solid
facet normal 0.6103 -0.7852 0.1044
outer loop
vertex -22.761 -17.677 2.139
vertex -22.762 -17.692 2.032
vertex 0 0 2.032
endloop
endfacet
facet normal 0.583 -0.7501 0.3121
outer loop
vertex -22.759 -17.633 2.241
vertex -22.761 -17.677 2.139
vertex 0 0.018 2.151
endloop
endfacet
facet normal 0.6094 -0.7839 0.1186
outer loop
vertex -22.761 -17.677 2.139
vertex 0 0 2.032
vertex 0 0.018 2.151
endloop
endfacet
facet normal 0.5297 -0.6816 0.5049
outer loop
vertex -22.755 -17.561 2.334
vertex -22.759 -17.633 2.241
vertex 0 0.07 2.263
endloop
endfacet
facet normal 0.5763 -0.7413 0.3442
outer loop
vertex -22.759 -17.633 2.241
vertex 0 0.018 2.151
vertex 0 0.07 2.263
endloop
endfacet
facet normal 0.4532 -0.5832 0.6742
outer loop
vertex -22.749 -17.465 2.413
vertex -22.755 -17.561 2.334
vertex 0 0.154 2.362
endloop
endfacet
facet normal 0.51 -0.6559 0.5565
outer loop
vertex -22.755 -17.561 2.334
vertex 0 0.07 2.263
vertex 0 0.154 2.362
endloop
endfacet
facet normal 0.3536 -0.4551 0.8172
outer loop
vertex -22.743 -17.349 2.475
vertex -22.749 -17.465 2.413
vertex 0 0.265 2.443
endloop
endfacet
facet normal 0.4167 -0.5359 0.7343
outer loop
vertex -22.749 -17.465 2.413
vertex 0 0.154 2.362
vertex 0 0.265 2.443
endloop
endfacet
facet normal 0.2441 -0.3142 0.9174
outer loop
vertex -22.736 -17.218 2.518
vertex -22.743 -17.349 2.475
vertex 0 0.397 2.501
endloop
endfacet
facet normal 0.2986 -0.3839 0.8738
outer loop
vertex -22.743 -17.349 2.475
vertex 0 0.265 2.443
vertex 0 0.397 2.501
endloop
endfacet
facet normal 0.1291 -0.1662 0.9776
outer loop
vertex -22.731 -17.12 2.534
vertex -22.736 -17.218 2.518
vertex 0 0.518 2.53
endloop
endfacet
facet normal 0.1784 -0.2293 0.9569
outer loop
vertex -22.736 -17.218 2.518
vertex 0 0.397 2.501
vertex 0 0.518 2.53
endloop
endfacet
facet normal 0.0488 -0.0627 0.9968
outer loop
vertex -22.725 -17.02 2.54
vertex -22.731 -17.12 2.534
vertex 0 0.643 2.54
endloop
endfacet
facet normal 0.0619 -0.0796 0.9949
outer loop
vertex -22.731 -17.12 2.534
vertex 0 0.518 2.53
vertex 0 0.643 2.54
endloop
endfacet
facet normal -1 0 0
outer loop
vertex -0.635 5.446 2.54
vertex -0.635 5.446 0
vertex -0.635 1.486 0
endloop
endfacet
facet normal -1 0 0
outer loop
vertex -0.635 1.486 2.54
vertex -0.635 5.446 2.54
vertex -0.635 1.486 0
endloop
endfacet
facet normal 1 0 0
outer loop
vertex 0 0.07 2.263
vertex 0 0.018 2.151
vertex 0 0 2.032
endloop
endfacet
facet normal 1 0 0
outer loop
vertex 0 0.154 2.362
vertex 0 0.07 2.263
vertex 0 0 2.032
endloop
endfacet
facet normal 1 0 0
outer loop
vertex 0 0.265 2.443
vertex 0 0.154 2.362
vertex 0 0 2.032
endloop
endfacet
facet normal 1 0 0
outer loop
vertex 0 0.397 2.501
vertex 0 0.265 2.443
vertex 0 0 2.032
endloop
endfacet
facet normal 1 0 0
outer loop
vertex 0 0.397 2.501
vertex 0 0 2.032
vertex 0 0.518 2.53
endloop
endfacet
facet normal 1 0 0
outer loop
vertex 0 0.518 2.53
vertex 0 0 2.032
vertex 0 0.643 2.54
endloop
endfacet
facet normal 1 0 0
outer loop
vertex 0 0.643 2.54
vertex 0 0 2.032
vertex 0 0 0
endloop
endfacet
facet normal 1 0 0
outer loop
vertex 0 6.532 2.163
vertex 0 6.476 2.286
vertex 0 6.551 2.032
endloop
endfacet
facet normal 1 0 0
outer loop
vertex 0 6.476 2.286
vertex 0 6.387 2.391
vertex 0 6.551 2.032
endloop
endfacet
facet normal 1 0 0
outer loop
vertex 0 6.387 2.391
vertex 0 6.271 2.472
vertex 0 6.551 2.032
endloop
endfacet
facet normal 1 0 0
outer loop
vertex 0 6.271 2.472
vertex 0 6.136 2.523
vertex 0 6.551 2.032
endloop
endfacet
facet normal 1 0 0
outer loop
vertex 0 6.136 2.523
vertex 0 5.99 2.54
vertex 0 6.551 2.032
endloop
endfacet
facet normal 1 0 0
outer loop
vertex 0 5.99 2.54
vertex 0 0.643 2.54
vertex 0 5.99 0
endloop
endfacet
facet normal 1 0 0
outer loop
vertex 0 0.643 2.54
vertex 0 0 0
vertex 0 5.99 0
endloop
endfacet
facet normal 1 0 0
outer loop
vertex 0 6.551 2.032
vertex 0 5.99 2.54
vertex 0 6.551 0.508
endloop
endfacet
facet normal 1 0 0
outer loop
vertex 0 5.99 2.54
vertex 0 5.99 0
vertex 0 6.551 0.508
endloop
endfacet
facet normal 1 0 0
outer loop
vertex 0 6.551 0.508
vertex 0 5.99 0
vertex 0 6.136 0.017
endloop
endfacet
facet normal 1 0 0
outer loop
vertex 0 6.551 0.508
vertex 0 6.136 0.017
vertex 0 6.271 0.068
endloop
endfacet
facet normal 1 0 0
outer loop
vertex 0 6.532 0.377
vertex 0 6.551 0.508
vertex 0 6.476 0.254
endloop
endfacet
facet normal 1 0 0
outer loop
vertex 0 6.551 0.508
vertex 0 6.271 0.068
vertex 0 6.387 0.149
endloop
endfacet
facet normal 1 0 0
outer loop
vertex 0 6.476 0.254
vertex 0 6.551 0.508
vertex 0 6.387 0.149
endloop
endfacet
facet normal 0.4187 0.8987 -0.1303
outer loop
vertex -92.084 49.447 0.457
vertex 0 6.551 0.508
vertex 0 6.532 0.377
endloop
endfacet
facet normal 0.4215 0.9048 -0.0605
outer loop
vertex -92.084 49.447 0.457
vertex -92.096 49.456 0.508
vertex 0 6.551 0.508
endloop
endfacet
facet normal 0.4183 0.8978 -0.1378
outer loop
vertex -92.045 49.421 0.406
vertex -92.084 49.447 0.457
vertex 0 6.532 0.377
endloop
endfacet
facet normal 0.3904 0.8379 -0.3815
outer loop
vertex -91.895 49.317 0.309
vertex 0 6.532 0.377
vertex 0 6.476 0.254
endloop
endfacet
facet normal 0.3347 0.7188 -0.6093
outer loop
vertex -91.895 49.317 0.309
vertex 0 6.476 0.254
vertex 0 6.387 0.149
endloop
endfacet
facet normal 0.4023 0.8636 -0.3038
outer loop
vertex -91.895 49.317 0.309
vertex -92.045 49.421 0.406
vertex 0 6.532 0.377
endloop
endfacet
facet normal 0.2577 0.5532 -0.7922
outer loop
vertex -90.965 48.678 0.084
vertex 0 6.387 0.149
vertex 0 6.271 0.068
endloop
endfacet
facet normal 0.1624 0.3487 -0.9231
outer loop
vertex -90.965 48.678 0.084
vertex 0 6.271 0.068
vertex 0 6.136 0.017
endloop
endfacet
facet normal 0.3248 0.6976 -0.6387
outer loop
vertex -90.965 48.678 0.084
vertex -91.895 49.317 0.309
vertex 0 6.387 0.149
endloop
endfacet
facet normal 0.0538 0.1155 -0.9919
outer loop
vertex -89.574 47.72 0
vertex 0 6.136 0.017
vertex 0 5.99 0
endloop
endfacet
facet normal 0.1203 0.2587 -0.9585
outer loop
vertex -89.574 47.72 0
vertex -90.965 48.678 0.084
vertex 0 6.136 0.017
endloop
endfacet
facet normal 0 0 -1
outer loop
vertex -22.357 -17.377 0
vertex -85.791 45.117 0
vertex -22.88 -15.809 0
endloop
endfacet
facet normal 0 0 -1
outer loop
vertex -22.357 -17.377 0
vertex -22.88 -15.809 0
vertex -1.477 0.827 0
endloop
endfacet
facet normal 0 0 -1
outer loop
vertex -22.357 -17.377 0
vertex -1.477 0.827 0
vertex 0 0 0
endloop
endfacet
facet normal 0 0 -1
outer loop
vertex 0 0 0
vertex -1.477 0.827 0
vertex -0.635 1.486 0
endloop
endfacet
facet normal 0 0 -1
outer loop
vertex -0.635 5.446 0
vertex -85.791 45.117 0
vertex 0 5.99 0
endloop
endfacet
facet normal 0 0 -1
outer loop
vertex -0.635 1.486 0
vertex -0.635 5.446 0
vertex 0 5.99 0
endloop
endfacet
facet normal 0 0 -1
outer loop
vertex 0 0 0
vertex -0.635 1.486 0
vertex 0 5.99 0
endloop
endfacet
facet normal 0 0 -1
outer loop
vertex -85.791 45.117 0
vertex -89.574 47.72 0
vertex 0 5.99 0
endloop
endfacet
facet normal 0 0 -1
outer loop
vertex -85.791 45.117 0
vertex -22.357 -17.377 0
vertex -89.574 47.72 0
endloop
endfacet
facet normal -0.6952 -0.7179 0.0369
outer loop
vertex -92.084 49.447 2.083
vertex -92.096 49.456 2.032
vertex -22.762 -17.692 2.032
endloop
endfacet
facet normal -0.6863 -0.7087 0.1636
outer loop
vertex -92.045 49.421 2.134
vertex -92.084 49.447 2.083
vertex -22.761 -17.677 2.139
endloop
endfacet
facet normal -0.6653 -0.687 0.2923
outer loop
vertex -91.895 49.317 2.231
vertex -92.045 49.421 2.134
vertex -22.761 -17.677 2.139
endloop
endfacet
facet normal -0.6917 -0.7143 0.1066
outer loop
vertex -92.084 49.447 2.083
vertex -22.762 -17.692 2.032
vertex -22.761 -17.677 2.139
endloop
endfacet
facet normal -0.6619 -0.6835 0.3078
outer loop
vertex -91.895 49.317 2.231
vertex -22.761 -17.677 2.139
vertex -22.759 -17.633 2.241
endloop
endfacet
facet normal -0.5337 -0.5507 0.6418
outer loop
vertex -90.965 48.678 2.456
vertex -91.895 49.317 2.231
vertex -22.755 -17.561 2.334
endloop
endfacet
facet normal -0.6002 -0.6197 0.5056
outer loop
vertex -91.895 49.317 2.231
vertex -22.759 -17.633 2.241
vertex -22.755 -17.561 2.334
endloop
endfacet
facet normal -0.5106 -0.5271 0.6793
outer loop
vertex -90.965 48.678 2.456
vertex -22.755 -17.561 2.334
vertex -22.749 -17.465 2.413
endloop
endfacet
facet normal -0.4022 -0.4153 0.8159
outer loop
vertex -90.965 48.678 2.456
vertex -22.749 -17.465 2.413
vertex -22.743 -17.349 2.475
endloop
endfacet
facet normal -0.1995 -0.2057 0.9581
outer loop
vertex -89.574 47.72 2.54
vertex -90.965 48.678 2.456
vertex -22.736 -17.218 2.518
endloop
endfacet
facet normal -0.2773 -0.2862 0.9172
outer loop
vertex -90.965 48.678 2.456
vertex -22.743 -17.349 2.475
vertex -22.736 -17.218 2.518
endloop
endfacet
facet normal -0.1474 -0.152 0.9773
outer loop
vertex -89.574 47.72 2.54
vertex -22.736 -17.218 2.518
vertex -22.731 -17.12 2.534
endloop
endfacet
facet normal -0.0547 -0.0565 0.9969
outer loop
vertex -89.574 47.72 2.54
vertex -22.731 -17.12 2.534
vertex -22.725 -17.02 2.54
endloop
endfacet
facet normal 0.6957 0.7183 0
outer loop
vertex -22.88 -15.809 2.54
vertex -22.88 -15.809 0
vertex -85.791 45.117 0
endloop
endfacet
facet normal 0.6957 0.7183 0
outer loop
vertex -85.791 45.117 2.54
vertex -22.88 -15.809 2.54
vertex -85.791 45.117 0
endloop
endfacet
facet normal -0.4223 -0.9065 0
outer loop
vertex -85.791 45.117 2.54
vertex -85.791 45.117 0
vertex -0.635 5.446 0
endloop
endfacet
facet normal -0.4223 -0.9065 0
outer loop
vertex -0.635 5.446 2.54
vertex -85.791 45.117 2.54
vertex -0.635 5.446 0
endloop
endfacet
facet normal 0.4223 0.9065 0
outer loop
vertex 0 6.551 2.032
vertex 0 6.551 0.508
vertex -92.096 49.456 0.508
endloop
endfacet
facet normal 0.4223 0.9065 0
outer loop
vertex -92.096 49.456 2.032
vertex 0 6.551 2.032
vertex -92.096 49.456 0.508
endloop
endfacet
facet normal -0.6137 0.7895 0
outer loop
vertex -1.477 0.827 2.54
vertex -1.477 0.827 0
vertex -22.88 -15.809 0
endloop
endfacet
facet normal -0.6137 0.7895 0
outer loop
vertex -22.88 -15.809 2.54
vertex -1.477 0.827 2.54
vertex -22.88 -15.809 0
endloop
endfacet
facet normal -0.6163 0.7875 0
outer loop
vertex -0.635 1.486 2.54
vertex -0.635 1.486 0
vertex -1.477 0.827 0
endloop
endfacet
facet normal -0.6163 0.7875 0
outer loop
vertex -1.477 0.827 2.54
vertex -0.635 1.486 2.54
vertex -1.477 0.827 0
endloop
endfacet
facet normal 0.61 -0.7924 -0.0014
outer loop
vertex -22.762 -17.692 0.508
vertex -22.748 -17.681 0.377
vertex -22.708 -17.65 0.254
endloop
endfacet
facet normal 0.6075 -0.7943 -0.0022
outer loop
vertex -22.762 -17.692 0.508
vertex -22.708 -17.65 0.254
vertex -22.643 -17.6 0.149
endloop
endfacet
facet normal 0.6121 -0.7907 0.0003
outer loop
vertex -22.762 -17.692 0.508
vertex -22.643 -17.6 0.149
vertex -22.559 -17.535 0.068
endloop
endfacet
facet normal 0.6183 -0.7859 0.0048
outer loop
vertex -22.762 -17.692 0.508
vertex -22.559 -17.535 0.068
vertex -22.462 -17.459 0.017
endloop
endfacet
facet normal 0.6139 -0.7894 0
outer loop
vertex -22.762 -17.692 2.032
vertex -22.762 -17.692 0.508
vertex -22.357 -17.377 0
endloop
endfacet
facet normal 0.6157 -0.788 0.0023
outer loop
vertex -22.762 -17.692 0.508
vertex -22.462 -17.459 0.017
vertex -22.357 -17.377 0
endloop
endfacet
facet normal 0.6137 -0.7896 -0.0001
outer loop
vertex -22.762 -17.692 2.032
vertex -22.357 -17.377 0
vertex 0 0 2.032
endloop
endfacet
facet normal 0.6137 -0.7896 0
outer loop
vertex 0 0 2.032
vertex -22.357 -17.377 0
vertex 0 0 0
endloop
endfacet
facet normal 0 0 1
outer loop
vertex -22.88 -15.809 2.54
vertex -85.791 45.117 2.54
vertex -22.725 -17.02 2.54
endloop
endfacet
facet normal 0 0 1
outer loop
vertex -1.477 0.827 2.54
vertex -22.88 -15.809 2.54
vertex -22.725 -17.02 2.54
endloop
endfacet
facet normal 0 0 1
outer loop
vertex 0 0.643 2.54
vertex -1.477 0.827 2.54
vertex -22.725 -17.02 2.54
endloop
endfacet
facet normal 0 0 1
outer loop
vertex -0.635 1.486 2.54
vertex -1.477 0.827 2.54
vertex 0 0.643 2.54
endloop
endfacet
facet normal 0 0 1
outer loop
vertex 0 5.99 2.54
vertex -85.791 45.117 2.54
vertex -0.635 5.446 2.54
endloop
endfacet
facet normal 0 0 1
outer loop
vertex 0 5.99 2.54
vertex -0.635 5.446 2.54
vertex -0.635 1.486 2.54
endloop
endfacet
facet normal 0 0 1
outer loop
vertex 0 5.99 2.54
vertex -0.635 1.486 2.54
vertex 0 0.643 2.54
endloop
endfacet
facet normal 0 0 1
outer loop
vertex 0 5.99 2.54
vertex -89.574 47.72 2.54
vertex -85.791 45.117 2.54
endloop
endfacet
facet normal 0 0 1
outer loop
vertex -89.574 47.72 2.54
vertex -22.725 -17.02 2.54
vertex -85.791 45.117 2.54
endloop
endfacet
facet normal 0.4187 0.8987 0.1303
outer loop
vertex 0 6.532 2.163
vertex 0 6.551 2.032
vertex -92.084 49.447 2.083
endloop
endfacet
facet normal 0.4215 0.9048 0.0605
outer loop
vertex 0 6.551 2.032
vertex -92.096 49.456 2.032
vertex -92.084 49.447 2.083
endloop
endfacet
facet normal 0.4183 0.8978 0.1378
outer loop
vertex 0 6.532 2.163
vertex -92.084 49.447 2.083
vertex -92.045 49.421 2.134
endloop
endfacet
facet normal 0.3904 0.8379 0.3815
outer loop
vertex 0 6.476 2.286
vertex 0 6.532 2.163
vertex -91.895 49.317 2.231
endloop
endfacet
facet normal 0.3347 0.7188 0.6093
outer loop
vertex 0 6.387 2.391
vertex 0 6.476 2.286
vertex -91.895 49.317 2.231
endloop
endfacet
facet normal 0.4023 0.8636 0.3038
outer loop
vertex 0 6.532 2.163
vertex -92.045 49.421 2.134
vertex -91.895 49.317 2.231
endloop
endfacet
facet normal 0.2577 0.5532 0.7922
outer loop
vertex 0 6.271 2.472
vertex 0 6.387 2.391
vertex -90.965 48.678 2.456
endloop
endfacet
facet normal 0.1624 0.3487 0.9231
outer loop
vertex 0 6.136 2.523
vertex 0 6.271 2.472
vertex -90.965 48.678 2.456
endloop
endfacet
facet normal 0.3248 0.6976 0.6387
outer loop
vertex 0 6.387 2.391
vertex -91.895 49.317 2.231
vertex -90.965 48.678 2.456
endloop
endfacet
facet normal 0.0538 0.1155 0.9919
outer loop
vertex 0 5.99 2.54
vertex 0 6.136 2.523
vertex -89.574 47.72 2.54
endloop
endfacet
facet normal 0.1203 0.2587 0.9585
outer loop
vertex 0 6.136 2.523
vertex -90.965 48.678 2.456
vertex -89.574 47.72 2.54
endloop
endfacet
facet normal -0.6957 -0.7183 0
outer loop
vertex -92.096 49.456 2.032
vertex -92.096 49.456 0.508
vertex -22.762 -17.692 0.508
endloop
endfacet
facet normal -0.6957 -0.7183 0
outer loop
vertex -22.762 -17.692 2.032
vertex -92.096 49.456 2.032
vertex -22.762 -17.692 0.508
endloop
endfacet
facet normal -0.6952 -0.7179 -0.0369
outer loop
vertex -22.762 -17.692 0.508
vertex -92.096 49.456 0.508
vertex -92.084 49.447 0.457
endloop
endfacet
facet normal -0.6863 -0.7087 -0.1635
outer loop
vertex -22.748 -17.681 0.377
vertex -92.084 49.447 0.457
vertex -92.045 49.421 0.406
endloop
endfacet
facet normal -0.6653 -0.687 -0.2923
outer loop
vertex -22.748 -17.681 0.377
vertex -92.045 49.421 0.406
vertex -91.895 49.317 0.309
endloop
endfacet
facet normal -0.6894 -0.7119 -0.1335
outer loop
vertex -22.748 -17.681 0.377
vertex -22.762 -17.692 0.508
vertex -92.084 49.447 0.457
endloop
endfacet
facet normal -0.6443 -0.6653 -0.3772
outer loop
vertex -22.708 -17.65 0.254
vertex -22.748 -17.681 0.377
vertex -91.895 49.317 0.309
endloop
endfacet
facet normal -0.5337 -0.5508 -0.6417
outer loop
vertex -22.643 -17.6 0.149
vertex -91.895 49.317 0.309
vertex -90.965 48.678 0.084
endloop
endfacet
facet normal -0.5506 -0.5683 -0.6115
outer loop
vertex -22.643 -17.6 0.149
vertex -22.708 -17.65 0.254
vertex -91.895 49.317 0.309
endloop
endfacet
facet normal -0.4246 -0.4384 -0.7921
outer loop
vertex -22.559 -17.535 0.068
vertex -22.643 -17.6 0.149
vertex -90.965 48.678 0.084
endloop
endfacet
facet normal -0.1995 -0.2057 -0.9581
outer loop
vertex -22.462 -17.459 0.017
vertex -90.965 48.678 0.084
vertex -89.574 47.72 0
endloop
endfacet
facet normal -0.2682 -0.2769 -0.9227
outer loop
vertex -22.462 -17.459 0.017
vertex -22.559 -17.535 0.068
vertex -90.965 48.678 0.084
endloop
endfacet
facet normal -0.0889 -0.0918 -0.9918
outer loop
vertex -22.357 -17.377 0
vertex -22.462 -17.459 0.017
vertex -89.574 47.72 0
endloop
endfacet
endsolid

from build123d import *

# Parameters (mm, degrees)
F1_DEPTH = 2.54
F2_R     = 0.508


with BuildPart() as f1:
    # F0 (on Top) → F1 (new body)
    with BuildSketch(Plane.XY):
        Polygon((-22.761848, -17.692075), (0, 0), (0, 6.550886), (-92.096252, 49.455902), align=None)
        Polygon((-85.790934, 45.117378), (-0.635, 5.445659), (-0.635, 1.485886), (-1.476617, 0.826895), (-22.88023, -15.809466), align=None, mode=Mode.SUBTRACT)
    extrude(amount=F1_DEPTH)

    # F2
    f2_edges = [f1.edges().sort_by_distance(p)[0] for p in [
        (-57.42905, 15.881913, 2.54),
        (-11.380924, -8.846038, 2.54),
        (-46.048126, 28.003394, 2.54),
        (-46.048126, 28.003394, 0),
        (-57.42905, 15.881913, 0),
    ]]
    fillet(f2_edges, radius=F2_R)


solid = f1.part
